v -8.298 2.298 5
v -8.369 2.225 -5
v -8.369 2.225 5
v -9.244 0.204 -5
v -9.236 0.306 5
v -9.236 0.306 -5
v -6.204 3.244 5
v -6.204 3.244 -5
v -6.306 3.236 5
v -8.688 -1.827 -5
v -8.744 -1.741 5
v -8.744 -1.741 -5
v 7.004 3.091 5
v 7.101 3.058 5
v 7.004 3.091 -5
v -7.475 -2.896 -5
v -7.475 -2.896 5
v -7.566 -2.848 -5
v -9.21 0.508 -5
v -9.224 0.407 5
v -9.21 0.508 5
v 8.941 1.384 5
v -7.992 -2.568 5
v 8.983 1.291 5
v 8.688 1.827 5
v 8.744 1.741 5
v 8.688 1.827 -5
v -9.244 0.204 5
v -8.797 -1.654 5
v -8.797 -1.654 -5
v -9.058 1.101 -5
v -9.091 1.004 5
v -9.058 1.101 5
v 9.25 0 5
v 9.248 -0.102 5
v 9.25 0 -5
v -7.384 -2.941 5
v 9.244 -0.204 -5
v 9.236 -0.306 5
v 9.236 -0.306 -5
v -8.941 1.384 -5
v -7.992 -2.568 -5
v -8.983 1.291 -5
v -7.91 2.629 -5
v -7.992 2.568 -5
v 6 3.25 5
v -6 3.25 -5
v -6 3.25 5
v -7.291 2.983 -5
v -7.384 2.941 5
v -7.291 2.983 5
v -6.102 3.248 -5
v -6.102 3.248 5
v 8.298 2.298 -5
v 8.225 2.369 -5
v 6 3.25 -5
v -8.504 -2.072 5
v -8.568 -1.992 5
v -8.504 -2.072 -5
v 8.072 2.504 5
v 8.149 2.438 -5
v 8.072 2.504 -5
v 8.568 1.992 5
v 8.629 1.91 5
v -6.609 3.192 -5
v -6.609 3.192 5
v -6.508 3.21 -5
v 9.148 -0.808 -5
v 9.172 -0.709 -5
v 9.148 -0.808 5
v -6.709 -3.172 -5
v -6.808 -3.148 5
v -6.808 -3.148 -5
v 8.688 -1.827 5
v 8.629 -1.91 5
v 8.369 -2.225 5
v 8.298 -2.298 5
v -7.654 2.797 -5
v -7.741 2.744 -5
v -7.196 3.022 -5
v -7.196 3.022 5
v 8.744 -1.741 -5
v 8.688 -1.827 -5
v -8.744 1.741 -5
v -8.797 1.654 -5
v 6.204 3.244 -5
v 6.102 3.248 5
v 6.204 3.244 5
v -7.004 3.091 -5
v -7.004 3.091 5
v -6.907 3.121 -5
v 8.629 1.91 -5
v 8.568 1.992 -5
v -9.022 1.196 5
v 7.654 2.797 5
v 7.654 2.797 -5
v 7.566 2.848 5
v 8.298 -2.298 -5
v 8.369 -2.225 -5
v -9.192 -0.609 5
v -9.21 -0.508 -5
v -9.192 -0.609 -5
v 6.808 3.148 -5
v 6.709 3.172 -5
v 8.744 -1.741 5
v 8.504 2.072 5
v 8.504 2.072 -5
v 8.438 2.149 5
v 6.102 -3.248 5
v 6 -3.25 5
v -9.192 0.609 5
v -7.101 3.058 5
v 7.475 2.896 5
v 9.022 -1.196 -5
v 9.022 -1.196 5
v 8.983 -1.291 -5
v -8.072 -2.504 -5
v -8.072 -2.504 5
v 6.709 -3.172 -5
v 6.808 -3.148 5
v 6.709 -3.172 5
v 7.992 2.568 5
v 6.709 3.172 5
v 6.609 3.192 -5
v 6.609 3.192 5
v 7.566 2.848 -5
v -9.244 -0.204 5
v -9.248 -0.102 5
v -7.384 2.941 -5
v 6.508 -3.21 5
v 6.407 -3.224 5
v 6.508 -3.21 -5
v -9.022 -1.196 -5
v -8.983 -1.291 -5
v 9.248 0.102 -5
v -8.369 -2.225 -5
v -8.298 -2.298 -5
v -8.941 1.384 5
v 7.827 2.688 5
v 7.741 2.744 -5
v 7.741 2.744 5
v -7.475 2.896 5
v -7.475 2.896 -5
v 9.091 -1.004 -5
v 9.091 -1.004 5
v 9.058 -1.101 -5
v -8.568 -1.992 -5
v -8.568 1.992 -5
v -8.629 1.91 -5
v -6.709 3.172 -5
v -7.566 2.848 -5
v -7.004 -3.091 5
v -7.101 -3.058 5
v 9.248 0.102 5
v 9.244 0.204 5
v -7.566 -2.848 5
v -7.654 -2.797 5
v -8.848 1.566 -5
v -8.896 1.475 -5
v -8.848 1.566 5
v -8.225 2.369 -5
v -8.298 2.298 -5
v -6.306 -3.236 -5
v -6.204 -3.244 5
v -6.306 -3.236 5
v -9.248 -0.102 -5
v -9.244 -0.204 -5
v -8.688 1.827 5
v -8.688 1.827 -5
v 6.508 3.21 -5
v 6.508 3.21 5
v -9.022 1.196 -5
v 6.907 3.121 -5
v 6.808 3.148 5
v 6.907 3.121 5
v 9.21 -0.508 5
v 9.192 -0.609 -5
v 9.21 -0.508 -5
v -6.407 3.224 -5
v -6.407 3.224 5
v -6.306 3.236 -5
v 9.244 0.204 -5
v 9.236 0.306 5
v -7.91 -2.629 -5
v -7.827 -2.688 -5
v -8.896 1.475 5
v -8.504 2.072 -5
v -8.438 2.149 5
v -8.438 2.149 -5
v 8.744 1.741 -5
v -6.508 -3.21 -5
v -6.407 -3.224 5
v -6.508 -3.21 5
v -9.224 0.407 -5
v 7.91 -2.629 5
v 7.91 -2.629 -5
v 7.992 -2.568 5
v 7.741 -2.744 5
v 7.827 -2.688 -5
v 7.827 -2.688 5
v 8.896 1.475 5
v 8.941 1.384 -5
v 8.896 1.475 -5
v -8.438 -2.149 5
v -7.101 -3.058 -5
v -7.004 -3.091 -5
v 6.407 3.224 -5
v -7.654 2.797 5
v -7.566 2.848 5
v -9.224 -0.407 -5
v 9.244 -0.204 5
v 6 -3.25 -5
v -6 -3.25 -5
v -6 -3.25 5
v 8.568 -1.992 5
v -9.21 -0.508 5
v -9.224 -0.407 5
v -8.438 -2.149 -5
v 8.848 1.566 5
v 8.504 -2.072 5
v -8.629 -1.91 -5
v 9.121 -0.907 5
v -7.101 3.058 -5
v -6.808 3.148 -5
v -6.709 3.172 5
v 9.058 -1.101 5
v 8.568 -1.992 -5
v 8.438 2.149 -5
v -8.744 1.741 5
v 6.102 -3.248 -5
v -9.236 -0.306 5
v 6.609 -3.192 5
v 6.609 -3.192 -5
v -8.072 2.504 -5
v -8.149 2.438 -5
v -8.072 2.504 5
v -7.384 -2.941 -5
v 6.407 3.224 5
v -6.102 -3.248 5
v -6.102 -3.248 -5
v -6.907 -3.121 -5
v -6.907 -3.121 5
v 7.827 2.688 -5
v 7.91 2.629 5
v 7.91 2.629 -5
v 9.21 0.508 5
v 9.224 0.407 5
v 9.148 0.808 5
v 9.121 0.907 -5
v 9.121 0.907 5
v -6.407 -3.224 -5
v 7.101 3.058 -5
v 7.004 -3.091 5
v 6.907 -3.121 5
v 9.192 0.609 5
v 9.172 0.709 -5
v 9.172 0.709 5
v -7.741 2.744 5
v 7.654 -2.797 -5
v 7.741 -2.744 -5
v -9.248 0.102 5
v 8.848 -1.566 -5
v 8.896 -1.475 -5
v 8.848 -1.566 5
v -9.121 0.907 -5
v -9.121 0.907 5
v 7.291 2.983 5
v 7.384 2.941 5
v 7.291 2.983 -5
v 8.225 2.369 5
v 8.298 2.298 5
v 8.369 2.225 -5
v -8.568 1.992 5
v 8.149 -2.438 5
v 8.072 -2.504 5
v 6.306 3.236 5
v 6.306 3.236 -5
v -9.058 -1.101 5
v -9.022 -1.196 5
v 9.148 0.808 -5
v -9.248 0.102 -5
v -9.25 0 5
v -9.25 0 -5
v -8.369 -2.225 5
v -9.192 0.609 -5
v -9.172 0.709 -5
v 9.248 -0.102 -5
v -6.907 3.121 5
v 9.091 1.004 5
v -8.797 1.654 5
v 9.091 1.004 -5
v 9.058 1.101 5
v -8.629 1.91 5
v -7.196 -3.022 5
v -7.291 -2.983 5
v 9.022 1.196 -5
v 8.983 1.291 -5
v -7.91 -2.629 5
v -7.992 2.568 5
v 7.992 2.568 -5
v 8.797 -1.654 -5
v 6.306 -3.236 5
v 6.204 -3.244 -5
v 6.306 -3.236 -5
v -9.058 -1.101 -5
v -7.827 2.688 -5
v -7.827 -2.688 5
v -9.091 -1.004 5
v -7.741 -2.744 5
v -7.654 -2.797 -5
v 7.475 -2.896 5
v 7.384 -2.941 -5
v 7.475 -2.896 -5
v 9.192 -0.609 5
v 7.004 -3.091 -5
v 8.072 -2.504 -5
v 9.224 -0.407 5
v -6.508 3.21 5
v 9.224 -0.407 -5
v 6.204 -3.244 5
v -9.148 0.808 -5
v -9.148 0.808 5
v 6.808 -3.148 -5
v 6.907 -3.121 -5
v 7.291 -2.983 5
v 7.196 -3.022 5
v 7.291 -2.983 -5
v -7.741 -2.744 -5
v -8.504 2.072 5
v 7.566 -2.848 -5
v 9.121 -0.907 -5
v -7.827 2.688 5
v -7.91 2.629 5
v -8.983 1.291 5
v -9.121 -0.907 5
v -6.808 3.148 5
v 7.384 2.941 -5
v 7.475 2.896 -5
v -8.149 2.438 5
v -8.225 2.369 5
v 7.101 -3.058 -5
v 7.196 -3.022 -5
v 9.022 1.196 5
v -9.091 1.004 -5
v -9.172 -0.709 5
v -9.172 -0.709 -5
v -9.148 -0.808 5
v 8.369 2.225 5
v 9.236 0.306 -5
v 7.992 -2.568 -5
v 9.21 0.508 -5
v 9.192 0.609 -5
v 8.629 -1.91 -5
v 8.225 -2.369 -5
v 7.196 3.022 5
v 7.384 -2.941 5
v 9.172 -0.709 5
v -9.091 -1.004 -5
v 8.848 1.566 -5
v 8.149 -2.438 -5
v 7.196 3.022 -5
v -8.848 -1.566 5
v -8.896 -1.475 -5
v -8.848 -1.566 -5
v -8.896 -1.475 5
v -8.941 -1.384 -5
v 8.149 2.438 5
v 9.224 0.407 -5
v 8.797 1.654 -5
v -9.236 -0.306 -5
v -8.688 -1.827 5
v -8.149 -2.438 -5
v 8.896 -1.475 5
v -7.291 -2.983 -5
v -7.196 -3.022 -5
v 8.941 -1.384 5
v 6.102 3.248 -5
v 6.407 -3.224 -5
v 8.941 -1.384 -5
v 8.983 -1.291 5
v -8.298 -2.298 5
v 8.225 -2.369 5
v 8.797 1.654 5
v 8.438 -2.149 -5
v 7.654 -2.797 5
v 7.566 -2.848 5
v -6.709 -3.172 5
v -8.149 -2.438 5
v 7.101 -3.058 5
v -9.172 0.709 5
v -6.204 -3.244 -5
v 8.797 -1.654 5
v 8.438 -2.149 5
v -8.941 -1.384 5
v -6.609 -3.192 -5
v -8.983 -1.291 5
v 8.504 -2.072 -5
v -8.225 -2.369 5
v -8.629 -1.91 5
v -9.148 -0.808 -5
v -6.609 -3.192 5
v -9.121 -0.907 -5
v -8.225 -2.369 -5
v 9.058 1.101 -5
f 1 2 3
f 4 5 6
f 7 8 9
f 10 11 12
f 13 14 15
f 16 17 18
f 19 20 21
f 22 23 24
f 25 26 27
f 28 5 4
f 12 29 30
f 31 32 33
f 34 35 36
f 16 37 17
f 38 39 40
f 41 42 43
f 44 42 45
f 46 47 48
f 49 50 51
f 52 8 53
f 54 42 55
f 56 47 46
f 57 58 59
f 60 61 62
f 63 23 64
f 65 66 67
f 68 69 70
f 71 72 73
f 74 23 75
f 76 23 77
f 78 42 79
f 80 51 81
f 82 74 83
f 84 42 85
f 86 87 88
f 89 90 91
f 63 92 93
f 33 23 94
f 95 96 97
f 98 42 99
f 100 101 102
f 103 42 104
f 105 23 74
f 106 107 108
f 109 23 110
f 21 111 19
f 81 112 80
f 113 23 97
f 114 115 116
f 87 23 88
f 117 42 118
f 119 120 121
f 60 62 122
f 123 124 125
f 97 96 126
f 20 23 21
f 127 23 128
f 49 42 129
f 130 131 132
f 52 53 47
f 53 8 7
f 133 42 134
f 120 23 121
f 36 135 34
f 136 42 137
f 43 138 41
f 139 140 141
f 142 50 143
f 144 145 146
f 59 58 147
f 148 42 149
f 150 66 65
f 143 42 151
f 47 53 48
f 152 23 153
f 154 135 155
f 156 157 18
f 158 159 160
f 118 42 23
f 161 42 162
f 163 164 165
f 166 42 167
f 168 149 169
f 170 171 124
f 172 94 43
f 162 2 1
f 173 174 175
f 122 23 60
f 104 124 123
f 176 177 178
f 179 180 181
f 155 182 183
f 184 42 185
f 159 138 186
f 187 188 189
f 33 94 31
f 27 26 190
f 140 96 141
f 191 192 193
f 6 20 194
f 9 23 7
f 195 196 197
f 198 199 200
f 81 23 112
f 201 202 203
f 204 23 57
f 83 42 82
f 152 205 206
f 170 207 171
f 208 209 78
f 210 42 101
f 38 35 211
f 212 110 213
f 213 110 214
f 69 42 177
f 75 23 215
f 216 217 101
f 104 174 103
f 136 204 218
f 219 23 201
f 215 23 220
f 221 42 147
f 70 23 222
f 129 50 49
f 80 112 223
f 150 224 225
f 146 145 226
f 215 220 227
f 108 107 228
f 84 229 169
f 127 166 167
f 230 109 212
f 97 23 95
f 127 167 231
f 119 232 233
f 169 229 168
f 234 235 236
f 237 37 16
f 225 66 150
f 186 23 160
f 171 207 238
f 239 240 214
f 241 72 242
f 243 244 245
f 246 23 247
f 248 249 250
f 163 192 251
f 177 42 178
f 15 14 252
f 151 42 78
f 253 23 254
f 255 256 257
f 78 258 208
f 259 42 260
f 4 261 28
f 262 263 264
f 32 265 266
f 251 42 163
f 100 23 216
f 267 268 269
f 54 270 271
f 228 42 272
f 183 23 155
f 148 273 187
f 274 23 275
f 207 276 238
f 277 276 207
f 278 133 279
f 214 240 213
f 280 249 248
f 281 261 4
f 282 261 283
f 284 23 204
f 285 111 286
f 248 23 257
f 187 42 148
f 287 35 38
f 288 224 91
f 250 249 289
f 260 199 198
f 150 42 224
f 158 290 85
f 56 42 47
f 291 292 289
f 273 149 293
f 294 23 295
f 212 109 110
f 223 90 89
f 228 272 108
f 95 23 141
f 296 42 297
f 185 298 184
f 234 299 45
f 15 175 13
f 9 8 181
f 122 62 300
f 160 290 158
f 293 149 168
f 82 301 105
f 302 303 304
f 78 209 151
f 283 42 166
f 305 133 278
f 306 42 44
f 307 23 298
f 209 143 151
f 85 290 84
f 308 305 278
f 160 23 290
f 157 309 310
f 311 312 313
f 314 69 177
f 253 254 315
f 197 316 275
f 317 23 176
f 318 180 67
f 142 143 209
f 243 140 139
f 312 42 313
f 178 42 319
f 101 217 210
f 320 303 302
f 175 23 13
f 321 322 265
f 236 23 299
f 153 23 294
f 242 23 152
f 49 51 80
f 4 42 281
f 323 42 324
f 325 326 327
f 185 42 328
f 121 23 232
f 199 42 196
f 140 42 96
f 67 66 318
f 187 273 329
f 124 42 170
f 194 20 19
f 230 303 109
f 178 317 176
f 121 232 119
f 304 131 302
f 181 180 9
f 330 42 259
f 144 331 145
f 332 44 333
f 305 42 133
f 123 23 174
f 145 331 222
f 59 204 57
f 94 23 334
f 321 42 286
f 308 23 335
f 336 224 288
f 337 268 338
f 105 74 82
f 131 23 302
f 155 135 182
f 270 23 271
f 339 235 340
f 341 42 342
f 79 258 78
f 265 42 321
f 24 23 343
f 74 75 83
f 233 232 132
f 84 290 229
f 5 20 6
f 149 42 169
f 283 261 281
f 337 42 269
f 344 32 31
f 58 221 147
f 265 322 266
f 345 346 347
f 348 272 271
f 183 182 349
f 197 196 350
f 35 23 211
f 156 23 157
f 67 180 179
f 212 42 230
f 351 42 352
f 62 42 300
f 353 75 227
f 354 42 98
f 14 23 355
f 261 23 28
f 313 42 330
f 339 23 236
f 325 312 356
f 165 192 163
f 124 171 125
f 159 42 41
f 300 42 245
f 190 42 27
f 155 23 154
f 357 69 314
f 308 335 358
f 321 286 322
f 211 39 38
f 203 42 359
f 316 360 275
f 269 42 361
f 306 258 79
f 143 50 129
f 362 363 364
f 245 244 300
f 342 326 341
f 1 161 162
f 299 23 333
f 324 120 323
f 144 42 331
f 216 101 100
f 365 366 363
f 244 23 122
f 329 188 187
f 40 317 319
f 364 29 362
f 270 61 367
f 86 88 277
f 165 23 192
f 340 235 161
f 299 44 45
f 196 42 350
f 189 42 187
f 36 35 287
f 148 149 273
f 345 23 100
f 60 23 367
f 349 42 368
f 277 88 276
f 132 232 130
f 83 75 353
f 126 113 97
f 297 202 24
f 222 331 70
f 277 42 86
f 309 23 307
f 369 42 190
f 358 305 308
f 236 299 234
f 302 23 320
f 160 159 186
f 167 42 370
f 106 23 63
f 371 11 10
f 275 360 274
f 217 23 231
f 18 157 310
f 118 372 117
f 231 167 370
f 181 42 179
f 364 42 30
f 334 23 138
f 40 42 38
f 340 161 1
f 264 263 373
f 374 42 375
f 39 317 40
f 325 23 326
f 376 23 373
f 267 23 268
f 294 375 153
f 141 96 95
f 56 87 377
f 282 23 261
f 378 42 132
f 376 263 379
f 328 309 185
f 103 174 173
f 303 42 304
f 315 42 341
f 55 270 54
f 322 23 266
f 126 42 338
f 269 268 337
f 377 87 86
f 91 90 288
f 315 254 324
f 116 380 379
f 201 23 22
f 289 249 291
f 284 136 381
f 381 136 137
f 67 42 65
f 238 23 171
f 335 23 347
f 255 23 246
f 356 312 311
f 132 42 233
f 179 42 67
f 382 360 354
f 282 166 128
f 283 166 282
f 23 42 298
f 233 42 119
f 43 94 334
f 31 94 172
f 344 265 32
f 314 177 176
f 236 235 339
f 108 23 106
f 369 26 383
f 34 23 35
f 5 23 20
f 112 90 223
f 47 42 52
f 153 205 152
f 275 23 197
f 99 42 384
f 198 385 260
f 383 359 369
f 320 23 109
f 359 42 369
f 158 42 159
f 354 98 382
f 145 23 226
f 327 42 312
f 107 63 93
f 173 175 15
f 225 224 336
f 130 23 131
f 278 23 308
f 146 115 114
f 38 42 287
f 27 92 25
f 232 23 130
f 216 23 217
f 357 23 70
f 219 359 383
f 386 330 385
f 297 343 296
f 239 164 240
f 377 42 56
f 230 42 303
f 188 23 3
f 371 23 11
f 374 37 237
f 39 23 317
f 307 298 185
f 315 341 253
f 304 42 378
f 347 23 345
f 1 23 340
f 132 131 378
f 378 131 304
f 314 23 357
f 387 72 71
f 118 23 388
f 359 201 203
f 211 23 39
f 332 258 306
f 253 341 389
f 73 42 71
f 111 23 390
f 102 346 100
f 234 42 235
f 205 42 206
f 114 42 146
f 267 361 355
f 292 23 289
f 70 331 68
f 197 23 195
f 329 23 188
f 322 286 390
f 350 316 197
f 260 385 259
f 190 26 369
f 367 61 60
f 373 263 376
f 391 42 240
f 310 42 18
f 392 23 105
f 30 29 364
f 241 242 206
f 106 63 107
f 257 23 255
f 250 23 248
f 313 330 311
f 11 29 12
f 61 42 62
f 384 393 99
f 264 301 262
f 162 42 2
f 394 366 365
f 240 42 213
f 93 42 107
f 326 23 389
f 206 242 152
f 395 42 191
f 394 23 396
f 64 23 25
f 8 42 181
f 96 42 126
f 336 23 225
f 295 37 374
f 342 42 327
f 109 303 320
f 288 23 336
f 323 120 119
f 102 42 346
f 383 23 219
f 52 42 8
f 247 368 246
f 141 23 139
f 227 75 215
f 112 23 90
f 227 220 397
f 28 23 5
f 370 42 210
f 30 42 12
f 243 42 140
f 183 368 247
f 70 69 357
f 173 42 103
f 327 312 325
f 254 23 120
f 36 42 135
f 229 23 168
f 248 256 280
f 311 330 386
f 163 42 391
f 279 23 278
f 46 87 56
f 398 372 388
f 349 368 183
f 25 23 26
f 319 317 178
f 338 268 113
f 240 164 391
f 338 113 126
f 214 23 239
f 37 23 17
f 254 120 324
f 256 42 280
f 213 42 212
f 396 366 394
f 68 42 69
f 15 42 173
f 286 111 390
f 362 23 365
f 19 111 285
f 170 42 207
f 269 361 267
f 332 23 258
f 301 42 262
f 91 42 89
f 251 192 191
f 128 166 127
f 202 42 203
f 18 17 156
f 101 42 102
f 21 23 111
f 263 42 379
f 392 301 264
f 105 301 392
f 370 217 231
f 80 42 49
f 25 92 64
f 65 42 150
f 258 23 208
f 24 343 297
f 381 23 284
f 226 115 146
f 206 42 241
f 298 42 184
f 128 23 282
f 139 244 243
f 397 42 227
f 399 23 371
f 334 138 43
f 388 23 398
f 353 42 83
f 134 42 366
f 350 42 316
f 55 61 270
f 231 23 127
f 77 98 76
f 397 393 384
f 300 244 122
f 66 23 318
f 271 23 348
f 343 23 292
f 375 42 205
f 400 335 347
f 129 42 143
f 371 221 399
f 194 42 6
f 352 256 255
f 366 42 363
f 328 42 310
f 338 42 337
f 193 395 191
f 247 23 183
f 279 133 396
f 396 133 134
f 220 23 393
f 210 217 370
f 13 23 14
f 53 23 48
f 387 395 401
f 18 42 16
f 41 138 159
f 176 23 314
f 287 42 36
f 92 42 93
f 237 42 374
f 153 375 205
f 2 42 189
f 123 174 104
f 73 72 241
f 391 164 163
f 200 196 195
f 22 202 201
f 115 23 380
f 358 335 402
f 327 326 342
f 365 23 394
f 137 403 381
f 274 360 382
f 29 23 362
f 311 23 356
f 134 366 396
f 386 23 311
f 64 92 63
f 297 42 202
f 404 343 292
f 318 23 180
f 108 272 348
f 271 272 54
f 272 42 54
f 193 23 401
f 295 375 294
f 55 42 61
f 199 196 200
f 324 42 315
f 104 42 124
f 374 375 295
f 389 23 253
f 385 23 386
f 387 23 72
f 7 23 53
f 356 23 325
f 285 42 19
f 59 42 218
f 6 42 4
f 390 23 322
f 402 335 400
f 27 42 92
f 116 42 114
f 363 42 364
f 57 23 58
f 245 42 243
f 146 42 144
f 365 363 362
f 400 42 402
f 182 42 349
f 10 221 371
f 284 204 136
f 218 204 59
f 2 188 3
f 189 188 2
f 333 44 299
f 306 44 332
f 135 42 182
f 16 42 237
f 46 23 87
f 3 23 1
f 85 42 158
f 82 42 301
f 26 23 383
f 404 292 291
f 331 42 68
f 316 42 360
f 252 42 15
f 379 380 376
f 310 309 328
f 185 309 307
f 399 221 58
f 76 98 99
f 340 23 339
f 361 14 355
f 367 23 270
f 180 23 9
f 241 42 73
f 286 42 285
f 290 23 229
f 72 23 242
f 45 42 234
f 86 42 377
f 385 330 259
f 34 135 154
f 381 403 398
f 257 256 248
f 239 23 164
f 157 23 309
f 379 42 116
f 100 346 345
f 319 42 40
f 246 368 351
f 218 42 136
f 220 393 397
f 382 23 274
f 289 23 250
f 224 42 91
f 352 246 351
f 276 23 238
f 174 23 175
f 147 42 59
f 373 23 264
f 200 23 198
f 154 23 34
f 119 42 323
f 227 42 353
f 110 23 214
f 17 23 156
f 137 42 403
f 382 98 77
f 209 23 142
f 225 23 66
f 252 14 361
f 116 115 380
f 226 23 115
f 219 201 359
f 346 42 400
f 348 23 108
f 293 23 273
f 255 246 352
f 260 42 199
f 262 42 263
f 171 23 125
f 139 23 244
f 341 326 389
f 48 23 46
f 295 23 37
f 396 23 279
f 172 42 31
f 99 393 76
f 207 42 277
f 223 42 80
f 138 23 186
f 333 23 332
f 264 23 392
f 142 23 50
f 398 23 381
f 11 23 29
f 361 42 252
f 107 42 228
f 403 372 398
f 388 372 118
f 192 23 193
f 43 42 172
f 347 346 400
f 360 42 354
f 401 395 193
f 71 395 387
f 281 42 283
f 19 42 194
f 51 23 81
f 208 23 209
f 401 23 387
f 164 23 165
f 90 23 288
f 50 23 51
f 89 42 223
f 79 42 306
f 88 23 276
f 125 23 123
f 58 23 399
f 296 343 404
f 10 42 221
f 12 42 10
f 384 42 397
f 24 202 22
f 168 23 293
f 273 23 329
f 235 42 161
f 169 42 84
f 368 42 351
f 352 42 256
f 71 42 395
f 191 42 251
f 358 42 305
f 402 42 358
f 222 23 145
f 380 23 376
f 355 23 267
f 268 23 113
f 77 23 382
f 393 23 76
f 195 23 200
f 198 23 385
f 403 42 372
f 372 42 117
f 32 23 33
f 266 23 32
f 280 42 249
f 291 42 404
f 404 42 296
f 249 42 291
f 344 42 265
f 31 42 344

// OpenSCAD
usbHoleEnvelope();

module usbHoleEnvelope(
    height = 6.5,
    width = 12,
    thickness = 10,
    center = true,
    $fn = 200
) {
    hull() {
        translate([- width / 2, 0, 0])
            cylinder(h = thickness, d = height, center = center, $fn = $fn);

        translate([width / 2, 0, 0])
            cylinder(h = thickness, d = height, center = center, $fn = $fn);
    }
}
